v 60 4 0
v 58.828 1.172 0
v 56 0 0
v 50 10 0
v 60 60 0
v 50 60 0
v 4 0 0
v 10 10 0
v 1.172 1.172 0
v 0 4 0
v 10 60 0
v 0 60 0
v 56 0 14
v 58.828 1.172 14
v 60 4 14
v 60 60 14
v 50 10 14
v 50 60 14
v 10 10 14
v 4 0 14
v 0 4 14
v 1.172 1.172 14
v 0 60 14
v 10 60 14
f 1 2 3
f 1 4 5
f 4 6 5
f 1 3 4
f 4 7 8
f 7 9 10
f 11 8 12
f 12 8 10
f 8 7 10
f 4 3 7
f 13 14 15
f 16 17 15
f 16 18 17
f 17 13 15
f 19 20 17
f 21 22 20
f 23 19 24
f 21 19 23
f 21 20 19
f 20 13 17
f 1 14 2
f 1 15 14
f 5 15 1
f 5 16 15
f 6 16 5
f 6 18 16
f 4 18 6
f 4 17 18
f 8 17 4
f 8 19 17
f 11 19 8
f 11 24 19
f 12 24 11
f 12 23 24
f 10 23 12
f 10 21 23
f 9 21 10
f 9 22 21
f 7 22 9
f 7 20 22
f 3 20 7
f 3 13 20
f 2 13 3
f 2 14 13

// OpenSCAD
$fn = 32;

// ----------------------------------------------------------------------
// Heat sink frame: 60 x 60 mm frame, 10 mm walls
// ----------------------------------------------------------------------

// --- parameters (mm) ---
profile_height = 14;      // extrusion height
profile_points = 12;      // points of the closed outline

profile = [[0, 4], [1.172, 1.172], [4, 0], [56, 0], [58.828, 1.172], [60, 4], [60, 60], [50, 60], [50, 10], [10, 10], [10, 60], [0, 60]];  // single closed polygon, 12 points, counter clockwise

// --- the one profile operation ---
linear_extrude(height = profile_height) polygon(points = profile);
